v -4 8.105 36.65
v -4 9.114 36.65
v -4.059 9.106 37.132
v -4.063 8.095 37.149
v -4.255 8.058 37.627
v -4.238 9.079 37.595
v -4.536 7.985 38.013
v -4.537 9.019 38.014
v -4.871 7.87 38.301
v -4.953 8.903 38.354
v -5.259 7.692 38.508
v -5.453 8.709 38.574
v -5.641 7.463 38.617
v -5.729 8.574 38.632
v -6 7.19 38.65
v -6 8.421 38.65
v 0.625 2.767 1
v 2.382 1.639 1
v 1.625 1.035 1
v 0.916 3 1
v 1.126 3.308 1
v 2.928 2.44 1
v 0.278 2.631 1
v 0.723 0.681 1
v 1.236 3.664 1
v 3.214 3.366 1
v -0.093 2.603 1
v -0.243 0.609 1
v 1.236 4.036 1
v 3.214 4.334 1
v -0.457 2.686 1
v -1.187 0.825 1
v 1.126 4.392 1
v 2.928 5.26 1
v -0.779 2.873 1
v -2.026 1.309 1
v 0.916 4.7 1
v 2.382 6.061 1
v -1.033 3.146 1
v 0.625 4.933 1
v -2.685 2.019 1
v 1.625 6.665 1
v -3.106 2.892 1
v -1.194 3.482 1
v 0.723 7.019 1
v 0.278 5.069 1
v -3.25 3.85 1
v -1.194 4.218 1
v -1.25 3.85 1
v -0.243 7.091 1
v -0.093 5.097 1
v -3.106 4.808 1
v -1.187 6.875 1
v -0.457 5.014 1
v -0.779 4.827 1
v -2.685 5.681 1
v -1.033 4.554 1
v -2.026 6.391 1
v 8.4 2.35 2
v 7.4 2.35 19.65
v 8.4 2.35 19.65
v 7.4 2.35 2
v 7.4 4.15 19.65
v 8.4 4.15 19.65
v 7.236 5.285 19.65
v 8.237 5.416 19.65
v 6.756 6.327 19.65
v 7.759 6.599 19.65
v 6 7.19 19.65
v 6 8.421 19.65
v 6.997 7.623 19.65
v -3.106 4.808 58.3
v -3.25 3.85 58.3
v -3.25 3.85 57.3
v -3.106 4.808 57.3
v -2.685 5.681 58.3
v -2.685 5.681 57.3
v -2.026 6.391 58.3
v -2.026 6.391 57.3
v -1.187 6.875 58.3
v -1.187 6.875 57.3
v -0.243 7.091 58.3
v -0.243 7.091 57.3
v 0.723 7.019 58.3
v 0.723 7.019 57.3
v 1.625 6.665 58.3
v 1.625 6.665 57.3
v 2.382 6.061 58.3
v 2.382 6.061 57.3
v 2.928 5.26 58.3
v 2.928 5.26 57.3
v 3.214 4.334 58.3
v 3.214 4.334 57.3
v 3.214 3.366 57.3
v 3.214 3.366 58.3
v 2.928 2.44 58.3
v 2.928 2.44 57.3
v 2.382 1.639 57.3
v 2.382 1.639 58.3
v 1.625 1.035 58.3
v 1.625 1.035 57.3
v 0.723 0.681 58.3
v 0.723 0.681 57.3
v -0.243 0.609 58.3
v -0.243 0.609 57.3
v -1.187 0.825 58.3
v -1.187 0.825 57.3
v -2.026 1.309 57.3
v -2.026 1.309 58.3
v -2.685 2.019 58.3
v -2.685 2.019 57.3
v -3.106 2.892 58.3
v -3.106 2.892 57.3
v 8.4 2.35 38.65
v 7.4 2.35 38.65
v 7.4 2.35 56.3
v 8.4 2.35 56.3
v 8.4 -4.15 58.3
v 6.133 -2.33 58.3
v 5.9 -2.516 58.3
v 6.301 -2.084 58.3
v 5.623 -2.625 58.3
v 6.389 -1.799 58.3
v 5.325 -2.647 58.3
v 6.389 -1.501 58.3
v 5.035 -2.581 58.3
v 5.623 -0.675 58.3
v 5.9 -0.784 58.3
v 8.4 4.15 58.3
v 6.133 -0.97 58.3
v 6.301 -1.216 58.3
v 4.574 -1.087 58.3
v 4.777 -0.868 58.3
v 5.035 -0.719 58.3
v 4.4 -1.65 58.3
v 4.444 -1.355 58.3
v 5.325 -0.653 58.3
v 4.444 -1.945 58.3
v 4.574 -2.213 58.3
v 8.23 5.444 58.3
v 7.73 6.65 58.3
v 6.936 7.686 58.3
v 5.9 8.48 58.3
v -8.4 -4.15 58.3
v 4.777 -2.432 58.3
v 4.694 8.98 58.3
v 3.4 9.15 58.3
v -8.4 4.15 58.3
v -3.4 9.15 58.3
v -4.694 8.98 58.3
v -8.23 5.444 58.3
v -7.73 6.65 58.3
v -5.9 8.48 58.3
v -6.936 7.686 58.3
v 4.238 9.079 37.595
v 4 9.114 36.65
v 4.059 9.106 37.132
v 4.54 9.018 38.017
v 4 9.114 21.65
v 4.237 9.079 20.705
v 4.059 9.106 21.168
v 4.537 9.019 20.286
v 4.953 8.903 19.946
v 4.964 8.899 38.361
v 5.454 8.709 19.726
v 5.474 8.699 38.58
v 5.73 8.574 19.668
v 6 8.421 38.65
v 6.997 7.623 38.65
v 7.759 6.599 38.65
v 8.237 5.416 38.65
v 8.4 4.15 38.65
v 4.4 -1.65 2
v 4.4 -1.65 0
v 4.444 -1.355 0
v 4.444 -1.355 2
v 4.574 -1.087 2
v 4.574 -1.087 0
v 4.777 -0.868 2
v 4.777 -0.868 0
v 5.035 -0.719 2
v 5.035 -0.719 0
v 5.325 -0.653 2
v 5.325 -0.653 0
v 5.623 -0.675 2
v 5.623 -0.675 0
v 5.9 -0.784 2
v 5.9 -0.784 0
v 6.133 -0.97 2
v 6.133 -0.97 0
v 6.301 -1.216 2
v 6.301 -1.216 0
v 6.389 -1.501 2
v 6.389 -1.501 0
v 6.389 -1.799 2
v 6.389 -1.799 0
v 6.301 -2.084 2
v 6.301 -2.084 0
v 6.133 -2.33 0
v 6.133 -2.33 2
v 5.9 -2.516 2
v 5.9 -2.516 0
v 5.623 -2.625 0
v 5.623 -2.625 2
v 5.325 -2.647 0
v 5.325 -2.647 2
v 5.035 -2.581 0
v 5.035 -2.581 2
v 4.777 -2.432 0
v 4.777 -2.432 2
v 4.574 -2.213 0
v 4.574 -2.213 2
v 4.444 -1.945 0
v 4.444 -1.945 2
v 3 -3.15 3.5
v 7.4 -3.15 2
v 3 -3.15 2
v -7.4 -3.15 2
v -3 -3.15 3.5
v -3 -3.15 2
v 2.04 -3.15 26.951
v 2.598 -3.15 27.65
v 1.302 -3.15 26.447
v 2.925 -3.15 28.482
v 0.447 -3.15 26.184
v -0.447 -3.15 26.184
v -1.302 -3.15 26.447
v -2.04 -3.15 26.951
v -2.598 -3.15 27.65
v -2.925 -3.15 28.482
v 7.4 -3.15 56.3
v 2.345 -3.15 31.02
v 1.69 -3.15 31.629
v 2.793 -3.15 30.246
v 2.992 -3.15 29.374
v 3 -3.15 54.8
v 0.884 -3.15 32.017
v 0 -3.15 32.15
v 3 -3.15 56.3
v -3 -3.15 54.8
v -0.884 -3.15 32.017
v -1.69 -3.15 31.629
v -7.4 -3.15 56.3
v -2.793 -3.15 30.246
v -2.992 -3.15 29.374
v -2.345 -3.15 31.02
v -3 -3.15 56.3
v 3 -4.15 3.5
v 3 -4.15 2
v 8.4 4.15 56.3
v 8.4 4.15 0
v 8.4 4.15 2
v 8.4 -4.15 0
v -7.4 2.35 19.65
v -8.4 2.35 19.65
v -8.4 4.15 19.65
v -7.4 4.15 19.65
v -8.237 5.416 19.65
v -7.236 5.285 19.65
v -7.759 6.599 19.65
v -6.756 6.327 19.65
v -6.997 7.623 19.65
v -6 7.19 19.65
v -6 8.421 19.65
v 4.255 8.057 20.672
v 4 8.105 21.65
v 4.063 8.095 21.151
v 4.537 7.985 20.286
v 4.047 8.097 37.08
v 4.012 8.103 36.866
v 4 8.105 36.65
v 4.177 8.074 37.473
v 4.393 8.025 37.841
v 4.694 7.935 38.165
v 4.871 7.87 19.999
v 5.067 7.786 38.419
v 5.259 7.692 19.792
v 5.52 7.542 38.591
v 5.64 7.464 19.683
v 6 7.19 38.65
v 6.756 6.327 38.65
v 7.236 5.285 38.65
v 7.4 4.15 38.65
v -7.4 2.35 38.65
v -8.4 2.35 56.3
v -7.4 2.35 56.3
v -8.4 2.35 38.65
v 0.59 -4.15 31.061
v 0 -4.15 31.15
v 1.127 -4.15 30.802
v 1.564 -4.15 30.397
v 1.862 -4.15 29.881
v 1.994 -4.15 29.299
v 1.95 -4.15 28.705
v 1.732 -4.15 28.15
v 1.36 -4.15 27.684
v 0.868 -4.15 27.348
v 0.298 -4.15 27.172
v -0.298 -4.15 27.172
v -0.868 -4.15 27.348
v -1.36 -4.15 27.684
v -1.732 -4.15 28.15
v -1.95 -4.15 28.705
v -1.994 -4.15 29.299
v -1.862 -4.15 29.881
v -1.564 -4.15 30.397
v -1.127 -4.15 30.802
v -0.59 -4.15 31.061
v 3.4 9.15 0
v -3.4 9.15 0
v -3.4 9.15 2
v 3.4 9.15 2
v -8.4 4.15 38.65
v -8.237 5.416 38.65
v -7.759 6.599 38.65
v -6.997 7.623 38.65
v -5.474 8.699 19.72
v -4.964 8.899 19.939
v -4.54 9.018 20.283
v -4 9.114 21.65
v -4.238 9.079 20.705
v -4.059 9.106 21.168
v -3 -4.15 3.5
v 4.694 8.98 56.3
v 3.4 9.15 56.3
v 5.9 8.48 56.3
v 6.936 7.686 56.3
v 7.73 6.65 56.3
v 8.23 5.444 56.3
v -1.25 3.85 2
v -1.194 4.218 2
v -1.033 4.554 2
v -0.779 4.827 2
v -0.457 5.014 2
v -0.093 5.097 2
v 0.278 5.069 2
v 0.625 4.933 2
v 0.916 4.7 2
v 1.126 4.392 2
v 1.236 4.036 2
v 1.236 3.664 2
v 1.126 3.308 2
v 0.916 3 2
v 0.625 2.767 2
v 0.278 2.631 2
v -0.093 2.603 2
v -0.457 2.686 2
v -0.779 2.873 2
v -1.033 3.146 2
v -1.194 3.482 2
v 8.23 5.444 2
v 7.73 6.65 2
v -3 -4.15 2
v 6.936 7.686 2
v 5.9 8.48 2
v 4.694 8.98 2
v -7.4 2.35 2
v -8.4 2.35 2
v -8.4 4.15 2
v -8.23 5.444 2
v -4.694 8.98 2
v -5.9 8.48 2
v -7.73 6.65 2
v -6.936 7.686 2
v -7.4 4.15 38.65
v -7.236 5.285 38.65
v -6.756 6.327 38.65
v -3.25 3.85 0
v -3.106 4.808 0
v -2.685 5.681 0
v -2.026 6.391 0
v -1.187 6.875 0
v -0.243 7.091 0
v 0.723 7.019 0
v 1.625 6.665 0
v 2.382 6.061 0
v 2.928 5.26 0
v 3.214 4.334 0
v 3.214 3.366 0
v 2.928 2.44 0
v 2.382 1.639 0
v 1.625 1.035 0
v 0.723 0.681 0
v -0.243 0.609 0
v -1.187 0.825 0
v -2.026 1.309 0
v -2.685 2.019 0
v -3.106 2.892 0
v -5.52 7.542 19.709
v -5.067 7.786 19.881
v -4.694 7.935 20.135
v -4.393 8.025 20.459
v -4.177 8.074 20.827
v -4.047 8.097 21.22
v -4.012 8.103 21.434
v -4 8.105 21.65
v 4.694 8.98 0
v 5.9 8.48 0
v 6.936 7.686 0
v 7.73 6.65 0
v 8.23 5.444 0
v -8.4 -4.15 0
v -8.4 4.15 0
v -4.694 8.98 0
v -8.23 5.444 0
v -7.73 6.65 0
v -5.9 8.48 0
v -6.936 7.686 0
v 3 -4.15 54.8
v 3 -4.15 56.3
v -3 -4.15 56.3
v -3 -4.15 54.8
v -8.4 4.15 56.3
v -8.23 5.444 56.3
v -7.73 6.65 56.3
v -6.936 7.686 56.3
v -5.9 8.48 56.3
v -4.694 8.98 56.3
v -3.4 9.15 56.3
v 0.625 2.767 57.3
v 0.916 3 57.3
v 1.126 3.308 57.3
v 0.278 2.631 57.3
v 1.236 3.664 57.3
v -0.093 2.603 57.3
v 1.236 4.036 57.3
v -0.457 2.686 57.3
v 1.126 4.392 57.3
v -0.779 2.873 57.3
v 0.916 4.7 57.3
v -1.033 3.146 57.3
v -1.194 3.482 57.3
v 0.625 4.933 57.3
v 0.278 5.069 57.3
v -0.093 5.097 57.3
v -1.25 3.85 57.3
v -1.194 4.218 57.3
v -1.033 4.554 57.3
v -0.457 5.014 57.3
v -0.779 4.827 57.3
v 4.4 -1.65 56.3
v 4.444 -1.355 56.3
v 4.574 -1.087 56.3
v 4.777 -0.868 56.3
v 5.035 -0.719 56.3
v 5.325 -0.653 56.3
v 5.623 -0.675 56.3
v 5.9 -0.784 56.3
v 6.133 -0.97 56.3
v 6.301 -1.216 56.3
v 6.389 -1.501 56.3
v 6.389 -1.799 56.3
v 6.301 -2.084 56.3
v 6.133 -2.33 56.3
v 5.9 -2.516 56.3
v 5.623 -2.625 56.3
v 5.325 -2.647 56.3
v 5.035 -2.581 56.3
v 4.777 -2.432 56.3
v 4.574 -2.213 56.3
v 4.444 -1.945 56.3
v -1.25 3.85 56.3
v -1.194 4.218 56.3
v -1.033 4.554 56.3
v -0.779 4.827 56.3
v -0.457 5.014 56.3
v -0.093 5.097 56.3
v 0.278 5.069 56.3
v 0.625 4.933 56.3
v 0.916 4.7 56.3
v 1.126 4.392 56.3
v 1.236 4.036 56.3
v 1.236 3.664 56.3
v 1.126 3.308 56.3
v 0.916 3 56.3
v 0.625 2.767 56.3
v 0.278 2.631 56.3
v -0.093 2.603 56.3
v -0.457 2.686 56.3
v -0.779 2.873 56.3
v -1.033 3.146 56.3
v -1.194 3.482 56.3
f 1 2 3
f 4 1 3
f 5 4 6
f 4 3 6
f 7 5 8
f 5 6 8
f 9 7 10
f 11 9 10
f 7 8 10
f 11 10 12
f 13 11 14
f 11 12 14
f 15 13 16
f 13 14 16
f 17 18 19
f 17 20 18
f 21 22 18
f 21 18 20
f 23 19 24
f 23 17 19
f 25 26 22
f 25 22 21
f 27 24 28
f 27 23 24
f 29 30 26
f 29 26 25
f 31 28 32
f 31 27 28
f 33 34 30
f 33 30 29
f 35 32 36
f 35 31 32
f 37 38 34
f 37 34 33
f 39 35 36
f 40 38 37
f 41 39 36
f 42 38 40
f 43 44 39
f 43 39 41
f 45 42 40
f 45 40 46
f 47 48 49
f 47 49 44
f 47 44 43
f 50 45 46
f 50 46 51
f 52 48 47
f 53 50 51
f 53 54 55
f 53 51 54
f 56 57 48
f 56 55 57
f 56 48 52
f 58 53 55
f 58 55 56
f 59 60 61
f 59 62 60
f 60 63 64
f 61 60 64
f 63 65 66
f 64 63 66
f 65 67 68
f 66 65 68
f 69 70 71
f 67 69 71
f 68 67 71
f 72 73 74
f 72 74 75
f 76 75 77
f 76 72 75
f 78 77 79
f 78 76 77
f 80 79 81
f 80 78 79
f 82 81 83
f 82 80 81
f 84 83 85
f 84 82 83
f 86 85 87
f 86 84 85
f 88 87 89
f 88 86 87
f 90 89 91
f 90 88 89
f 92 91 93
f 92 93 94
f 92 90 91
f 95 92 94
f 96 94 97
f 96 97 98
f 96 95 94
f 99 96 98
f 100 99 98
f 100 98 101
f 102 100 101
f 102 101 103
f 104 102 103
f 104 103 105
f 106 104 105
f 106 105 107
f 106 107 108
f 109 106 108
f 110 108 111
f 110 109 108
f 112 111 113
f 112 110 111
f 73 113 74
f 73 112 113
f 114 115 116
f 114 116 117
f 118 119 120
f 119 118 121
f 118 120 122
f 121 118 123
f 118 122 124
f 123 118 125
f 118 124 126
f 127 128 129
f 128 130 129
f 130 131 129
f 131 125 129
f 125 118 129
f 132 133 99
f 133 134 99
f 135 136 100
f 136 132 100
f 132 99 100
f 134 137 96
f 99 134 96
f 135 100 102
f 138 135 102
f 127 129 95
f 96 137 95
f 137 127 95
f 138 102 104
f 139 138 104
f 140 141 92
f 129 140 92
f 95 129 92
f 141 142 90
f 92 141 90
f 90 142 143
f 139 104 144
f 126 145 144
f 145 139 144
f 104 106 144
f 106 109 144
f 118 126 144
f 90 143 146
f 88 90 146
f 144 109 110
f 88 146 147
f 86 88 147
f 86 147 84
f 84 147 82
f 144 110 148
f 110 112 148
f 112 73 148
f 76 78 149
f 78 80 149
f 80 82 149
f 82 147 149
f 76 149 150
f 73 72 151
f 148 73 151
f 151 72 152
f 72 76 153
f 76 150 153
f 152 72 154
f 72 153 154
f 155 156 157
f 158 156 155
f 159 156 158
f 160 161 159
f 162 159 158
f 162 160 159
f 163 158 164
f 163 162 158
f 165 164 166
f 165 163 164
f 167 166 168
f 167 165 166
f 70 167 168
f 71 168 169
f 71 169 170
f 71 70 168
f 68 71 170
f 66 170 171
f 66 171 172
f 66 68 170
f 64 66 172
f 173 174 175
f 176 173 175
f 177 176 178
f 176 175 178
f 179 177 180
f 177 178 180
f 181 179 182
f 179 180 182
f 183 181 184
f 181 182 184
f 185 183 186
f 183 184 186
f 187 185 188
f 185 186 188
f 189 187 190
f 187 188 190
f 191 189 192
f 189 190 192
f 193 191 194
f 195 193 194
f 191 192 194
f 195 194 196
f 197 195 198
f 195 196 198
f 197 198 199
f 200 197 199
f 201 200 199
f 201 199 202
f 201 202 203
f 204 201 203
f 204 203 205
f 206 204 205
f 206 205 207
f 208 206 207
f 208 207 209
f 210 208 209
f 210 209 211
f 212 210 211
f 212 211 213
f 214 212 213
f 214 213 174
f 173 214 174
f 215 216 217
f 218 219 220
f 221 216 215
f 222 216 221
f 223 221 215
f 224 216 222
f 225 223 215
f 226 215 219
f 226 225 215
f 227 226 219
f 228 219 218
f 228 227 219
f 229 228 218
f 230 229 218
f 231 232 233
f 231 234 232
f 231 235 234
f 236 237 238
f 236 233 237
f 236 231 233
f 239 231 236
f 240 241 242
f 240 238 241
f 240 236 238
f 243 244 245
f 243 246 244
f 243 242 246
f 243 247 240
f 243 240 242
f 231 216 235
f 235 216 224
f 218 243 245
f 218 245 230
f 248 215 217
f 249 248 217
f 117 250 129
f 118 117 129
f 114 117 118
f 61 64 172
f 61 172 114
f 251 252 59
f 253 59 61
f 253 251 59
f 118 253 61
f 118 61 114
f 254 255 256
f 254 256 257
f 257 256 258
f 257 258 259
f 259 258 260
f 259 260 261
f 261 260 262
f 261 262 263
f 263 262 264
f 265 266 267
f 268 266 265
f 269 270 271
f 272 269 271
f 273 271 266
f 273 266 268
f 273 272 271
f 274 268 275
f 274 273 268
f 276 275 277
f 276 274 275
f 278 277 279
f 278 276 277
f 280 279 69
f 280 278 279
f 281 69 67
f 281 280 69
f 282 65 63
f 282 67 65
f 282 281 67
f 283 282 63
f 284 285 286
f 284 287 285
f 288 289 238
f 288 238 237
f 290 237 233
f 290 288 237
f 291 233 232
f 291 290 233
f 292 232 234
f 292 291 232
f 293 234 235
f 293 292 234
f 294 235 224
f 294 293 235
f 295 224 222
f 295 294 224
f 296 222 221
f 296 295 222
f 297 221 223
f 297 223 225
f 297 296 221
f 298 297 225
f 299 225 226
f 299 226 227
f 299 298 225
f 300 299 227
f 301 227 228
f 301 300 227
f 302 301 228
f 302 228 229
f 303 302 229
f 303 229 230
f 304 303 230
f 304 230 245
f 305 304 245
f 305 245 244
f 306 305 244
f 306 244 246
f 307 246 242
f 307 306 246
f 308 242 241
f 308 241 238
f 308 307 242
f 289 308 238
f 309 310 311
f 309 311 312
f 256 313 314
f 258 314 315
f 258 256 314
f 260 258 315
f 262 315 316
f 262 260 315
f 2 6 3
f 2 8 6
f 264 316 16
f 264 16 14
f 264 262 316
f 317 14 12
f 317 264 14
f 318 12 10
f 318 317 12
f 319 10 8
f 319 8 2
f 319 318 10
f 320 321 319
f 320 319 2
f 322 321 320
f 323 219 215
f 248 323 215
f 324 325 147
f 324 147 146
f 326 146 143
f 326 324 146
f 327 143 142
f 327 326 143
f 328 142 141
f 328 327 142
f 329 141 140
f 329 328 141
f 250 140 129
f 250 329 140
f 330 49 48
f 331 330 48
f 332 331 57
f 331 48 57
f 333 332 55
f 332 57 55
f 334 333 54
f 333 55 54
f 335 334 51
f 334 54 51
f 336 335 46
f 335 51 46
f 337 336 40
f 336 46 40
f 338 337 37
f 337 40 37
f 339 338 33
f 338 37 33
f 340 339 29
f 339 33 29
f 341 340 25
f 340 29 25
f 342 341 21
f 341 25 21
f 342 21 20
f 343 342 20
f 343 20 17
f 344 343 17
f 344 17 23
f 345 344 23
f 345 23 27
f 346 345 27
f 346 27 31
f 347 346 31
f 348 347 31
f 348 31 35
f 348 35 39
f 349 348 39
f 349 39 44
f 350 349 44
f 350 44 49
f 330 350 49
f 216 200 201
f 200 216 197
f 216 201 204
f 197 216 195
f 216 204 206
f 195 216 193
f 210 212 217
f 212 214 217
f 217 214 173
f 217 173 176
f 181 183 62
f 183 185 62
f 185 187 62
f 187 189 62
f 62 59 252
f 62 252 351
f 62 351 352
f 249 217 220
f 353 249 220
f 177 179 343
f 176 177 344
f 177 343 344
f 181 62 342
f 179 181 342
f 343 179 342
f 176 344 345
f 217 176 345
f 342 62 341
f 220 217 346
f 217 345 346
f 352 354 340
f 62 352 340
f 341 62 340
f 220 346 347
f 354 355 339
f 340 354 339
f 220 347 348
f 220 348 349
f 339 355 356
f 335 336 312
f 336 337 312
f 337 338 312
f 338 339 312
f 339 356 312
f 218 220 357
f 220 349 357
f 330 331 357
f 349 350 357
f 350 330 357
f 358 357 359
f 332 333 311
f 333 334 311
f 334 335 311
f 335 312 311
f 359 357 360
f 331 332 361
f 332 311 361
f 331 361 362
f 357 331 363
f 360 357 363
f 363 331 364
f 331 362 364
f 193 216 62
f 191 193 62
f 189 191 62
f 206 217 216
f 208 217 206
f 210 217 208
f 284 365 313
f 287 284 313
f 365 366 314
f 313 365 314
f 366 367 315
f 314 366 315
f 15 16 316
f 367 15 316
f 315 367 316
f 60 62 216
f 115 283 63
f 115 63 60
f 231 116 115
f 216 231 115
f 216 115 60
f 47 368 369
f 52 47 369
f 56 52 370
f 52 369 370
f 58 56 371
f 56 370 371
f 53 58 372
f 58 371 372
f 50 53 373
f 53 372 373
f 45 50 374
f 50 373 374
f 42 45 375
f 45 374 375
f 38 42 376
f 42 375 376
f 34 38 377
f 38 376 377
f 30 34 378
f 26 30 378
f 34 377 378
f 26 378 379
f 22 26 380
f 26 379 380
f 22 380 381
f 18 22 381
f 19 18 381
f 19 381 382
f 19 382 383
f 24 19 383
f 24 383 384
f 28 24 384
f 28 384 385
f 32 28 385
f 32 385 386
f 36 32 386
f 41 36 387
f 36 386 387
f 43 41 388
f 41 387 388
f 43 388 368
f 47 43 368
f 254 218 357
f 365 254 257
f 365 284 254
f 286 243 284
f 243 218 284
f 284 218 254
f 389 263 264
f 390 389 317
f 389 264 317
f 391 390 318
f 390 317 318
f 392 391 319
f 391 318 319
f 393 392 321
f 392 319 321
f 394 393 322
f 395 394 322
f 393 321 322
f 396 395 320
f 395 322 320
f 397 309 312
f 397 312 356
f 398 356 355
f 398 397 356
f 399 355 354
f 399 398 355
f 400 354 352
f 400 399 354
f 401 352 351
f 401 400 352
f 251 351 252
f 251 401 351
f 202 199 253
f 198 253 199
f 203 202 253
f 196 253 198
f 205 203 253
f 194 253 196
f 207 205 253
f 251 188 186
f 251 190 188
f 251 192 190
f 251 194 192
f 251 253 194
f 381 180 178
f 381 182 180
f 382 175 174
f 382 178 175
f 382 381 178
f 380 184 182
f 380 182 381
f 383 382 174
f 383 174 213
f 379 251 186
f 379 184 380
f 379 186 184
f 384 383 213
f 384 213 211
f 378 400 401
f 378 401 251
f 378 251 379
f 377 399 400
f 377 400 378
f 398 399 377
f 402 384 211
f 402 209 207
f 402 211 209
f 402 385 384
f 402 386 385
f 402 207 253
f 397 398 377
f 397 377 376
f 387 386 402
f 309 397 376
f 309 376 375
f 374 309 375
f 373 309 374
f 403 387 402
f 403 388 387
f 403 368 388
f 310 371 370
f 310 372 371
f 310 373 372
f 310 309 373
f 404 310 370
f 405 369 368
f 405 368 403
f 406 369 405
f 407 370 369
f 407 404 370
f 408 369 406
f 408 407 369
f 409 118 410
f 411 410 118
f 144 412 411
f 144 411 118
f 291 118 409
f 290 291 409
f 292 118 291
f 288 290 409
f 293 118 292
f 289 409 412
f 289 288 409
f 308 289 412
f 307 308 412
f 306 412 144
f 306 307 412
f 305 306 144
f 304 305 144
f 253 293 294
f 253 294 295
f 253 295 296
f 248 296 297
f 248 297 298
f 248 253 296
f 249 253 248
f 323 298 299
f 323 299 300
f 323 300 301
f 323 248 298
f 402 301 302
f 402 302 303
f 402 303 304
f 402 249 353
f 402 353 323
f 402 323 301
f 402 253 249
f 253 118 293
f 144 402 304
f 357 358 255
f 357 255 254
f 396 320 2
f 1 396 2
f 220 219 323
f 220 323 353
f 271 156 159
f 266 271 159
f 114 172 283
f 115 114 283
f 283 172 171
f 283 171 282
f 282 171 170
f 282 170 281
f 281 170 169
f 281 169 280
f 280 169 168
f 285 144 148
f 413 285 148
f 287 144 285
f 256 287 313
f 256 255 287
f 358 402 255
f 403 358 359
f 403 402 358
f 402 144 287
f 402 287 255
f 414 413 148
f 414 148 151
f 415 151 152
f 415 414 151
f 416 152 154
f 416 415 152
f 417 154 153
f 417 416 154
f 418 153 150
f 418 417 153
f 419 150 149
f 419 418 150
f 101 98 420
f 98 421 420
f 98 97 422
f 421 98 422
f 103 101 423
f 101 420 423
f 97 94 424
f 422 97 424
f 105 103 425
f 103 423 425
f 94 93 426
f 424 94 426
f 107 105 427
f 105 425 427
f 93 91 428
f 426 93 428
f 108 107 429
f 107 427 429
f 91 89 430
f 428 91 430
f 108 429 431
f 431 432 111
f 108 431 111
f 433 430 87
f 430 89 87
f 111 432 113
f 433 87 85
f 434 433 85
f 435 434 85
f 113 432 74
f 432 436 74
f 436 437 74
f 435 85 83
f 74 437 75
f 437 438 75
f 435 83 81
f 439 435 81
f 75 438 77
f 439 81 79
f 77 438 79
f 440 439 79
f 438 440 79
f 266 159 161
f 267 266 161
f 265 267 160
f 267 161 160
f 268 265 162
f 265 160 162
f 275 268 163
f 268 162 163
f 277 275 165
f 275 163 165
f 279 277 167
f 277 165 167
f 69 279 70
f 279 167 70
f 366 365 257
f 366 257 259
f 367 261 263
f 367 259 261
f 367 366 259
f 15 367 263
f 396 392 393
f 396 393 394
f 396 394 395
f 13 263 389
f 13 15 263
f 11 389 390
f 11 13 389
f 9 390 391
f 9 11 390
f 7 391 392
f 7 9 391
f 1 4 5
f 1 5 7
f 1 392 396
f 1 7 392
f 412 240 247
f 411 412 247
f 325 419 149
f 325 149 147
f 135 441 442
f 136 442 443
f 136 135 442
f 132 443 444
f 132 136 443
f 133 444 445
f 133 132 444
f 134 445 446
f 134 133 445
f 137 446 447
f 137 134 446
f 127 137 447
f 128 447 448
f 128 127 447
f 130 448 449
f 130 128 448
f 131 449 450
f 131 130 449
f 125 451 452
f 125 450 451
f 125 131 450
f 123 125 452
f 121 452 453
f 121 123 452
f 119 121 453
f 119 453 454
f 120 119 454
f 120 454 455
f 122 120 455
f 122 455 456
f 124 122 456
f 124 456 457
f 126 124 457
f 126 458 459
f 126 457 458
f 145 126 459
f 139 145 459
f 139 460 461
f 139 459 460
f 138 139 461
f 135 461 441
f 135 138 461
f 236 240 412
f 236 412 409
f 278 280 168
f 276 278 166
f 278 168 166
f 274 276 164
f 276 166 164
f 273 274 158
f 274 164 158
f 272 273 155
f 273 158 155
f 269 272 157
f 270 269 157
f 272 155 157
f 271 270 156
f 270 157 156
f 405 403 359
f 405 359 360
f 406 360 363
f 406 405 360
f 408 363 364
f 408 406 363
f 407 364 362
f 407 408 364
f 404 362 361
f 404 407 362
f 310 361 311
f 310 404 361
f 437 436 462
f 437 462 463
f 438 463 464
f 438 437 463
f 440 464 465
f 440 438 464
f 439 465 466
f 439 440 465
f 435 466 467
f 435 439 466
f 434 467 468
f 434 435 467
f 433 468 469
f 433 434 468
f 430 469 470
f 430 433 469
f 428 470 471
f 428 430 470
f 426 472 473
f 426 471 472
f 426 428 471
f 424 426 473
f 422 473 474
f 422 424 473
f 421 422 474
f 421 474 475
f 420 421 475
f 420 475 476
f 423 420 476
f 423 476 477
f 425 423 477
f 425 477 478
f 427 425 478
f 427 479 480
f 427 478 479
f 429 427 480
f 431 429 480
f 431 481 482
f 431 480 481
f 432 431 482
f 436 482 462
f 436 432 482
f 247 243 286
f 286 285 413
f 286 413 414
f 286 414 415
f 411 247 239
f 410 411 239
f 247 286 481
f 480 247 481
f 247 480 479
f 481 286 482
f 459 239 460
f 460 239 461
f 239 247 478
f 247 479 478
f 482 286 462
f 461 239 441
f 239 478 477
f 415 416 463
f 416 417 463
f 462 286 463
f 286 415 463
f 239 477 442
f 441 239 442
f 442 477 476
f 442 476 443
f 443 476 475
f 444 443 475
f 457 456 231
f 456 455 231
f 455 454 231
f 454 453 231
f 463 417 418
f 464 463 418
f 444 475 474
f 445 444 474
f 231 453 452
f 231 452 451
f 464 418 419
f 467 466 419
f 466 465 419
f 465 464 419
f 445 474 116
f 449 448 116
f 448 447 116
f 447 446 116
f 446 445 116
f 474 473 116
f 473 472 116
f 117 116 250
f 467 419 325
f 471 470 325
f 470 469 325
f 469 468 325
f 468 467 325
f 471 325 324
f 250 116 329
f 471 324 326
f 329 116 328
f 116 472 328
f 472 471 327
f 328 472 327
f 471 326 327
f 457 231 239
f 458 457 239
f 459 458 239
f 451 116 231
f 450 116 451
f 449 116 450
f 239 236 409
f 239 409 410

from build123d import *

# Parameters (mm, degrees)
EXTRUDE_1_DEPTH     = 58.3
CUT_EXTRUDE_1_DEPTH = 6.8
CUT_EXTRUDE_2_DEPTH = 54.3
SKETCH_5_R          = 2
CUT_EXTRUDE_4_DEPTH = 55
CHAMFER_2_SIZE      = 1
SKETCH_7_R          = 3.25
CUT_EXTRUDE_5_DEPTH = 1
SKETCH_8_R          = 1.25
CUT_EXTRUDE_6_DEPTH = 10
SKETCH_9_R          = 1
CUT_EXTRUDE_7_DEPTH = 10
SKETCH_11_W         = 6
SKETCH_11_H         = 1.5
CUT_EXTRUDE_8_DEPTH = 10


with BuildPart() as part:
    # Эскиз1 → Бобышка-Вытянуть1 (new body)
    with BuildSketch(Plane.XY):
        with BuildLine():
            Line((-3.4, 9.15), (3.4, 9.15))
            ThreePointArc((3.4, 9.15), (6.935533906, 7.685533906), (8.4, 4.15))
            Line((8.4, 4.15), (8.4, -4.15))
            Line((8.4, -4.15), (-8.4, -4.15))
            Line((-8.4, -4.15), (-8.4, 4.15))
            ThreePointArc((-8.4, 4.15), (-6.935533906, 7.685533906), (-3.4, 9.15))
        make_face()
    extrude(amount=EXTRUDE_1_DEPTH)

    # Эскиз2 → Вырез-Вытянуть1 (cut)
    with BuildSketch(Plane(origin=(0, 9.15, 0), x_dir=(1, 0, 0), z_dir=(0, 1, 0))):
        with BuildLine():
            Line((8.4, -19.65), (8.4, -2))
            Line((8.4, -2), (-8.4, -2))
            Line((-8.4, -2), (-8.4, -19.65))
            Line((-8.4, -19.65), (-6, -19.65))
            ThreePointArc((-6, -19.65), (-4.585786438, -20.235786438), (-4, -21.65))
            Line((-4, -21.65), (-4, -36.65))
            ThreePointArc((-4, -36.65), (-4.585786438, -38.064213562), (-6, -38.65))
            Line((-6, -38.65), (-8.4, -38.65))
            Line((-8.4, -38.65), (-8.4, -56.3))
            Line((-8.4, -56.3), (8.4, -56.3))
            Line((8.4, -56.3), (8.4, -38.65))
            Line((8.4, -38.65), (6, -38.65))
            ThreePointArc((6, -38.65), (4.585786438, -38.064213562), (4, -36.65))
            Line((4, -36.65), (4, -21.65))
            ThreePointArc((4, -21.65), (4.585786438, -20.235786438), (6, -19.65))
            Line((6, -19.65), (8.4, -19.65))
        make_face()
    extrude(amount=-CUT_EXTRUDE_1_DEPTH, mode=Mode.SUBTRACT)

    # Эскиз3 → Вырез-Вытянуть2 (cut)
    with BuildSketch(Plane(origin=(0, 0, 56.3), x_dir=(-1, 0, 0), z_dir=(0, 0, -1))):
        with BuildLine():
            Line((-7.4, 4.15), (-7.4, -3.15))
            Line((-7.4, -3.15), (7.4, -3.15))
            Line((7.4, -3.15), (7.4, 4.15))
            ThreePointArc((7.4, 4.15), (6.228427125, 6.978427125), (3.4, 8.15))
            Line((3.4, 8.15), (-3.4, 8.15))
            ThreePointArc((-3.4, 8.15), (-6.228427125, 6.978427125), (-7.4, 4.15))
        make_face()
    extrude(amount=CUT_EXTRUDE_2_DEPTH, mode=Mode.SUBTRACT)

    # Эскиз5 → Вырез-Вытянуть4 (cut)
    with BuildSketch(Plane(origin=(0, -3.15, 0), x_dir=(1, 0, 0), z_dir=(0, 1, 0))):
        with Locations(Location((0, -29.15, 0), (0, 0, 270))):
            Circle(SKETCH_5_R)
    extrude(amount=-CUT_EXTRUDE_4_DEPTH, mode=Mode.SUBTRACT)

    # Фаска2
    chamfer_2_edges = [part.edges().sort_by_distance(p)[0] for p in [
        (0, -3.15, 27.15),
    ]]
    chamfer(chamfer_2_edges, length=CHAMFER_2_SIZE - 0.0001)  # a hair under: the kernel refuses the full size

    # Эскиз7 → Вырез-Вытянуть5 (cut)
    with BuildSketch(Plane(origin=(0, 0, 0), x_dir=(-1, 0, 0), z_dir=(0, 0, -1))):
        with Locations((0, 3.85)):
            Circle(SKETCH_7_R)
    cut_extrude_5 = extrude(amount=-CUT_EXTRUDE_5_DEPTH, mode=Mode.SUBTRACT)

    # Эскиз8 → Вырез-Вытянуть6 (cut)
    with BuildSketch(Plane(origin=(0, 0, 0), x_dir=(-1, 0, 0), z_dir=(0, 0, -1))):
        with Locations((0, 3.85)):
            Circle(SKETCH_8_R)
    cut_extrude_6 = extrude(amount=-CUT_EXTRUDE_6_DEPTH, mode=Mode.SUBTRACT)

    # Эскиз9 → Вырез-Вытянуть7 (cut)
    with BuildSketch(Plane(origin=(0, 0, 0), x_dir=(-1, 0, 0), z_dir=(0, 0, -1))):
        with Locations((-5.4, -1.65)):
            Circle(SKETCH_9_R)
    cut_extrude_7 = extrude(amount=-CUT_EXTRUDE_7_DEPTH, mode=Mode.SUBTRACT)

    # Эскиз11 → Вырез-Вытянуть8 (cut)
    with BuildSketch(Plane(origin=(0, -3.15, 0), x_dir=(1, 0, 0), z_dir=(0, 1, 0))):
        with Locations((0, -2.75)):
            Rectangle(SKETCH_11_W, SKETCH_11_H)
    cut_extrude_8 = extrude(amount=-CUT_EXTRUDE_8_DEPTH, mode=Mode.SUBTRACT)

    # Зеркальное отражение1: Вырез-Вытянуть5, Вырез-Вытянуть6, Вырез-Вытянуть7, Вырез-Вытянуть8 across plane
    add(cut_extrude_5.mirror(Plane(origin=(0, 0, 29.15), x_dir=(1, 0, 0), z_dir=(0, 0, -1))), mode=Mode.SUBTRACT)
    add(cut_extrude_6.mirror(Plane(origin=(0, 0, 29.15), x_dir=(1, 0, 0), z_dir=(0, 0, -1))), mode=Mode.SUBTRACT)
    add(cut_extrude_7.mirror(Plane(origin=(0, 0, 29.15), x_dir=(1, 0, 0), z_dir=(0, 0, -1))), mode=Mode.SUBTRACT)
    add(cut_extrude_8.mirror(Plane(origin=(0, 0, 29.15), x_dir=(1, 0, 0), z_dir=(0, 0, -1))), mode=Mode.SUBTRACT)


solid = part.part
